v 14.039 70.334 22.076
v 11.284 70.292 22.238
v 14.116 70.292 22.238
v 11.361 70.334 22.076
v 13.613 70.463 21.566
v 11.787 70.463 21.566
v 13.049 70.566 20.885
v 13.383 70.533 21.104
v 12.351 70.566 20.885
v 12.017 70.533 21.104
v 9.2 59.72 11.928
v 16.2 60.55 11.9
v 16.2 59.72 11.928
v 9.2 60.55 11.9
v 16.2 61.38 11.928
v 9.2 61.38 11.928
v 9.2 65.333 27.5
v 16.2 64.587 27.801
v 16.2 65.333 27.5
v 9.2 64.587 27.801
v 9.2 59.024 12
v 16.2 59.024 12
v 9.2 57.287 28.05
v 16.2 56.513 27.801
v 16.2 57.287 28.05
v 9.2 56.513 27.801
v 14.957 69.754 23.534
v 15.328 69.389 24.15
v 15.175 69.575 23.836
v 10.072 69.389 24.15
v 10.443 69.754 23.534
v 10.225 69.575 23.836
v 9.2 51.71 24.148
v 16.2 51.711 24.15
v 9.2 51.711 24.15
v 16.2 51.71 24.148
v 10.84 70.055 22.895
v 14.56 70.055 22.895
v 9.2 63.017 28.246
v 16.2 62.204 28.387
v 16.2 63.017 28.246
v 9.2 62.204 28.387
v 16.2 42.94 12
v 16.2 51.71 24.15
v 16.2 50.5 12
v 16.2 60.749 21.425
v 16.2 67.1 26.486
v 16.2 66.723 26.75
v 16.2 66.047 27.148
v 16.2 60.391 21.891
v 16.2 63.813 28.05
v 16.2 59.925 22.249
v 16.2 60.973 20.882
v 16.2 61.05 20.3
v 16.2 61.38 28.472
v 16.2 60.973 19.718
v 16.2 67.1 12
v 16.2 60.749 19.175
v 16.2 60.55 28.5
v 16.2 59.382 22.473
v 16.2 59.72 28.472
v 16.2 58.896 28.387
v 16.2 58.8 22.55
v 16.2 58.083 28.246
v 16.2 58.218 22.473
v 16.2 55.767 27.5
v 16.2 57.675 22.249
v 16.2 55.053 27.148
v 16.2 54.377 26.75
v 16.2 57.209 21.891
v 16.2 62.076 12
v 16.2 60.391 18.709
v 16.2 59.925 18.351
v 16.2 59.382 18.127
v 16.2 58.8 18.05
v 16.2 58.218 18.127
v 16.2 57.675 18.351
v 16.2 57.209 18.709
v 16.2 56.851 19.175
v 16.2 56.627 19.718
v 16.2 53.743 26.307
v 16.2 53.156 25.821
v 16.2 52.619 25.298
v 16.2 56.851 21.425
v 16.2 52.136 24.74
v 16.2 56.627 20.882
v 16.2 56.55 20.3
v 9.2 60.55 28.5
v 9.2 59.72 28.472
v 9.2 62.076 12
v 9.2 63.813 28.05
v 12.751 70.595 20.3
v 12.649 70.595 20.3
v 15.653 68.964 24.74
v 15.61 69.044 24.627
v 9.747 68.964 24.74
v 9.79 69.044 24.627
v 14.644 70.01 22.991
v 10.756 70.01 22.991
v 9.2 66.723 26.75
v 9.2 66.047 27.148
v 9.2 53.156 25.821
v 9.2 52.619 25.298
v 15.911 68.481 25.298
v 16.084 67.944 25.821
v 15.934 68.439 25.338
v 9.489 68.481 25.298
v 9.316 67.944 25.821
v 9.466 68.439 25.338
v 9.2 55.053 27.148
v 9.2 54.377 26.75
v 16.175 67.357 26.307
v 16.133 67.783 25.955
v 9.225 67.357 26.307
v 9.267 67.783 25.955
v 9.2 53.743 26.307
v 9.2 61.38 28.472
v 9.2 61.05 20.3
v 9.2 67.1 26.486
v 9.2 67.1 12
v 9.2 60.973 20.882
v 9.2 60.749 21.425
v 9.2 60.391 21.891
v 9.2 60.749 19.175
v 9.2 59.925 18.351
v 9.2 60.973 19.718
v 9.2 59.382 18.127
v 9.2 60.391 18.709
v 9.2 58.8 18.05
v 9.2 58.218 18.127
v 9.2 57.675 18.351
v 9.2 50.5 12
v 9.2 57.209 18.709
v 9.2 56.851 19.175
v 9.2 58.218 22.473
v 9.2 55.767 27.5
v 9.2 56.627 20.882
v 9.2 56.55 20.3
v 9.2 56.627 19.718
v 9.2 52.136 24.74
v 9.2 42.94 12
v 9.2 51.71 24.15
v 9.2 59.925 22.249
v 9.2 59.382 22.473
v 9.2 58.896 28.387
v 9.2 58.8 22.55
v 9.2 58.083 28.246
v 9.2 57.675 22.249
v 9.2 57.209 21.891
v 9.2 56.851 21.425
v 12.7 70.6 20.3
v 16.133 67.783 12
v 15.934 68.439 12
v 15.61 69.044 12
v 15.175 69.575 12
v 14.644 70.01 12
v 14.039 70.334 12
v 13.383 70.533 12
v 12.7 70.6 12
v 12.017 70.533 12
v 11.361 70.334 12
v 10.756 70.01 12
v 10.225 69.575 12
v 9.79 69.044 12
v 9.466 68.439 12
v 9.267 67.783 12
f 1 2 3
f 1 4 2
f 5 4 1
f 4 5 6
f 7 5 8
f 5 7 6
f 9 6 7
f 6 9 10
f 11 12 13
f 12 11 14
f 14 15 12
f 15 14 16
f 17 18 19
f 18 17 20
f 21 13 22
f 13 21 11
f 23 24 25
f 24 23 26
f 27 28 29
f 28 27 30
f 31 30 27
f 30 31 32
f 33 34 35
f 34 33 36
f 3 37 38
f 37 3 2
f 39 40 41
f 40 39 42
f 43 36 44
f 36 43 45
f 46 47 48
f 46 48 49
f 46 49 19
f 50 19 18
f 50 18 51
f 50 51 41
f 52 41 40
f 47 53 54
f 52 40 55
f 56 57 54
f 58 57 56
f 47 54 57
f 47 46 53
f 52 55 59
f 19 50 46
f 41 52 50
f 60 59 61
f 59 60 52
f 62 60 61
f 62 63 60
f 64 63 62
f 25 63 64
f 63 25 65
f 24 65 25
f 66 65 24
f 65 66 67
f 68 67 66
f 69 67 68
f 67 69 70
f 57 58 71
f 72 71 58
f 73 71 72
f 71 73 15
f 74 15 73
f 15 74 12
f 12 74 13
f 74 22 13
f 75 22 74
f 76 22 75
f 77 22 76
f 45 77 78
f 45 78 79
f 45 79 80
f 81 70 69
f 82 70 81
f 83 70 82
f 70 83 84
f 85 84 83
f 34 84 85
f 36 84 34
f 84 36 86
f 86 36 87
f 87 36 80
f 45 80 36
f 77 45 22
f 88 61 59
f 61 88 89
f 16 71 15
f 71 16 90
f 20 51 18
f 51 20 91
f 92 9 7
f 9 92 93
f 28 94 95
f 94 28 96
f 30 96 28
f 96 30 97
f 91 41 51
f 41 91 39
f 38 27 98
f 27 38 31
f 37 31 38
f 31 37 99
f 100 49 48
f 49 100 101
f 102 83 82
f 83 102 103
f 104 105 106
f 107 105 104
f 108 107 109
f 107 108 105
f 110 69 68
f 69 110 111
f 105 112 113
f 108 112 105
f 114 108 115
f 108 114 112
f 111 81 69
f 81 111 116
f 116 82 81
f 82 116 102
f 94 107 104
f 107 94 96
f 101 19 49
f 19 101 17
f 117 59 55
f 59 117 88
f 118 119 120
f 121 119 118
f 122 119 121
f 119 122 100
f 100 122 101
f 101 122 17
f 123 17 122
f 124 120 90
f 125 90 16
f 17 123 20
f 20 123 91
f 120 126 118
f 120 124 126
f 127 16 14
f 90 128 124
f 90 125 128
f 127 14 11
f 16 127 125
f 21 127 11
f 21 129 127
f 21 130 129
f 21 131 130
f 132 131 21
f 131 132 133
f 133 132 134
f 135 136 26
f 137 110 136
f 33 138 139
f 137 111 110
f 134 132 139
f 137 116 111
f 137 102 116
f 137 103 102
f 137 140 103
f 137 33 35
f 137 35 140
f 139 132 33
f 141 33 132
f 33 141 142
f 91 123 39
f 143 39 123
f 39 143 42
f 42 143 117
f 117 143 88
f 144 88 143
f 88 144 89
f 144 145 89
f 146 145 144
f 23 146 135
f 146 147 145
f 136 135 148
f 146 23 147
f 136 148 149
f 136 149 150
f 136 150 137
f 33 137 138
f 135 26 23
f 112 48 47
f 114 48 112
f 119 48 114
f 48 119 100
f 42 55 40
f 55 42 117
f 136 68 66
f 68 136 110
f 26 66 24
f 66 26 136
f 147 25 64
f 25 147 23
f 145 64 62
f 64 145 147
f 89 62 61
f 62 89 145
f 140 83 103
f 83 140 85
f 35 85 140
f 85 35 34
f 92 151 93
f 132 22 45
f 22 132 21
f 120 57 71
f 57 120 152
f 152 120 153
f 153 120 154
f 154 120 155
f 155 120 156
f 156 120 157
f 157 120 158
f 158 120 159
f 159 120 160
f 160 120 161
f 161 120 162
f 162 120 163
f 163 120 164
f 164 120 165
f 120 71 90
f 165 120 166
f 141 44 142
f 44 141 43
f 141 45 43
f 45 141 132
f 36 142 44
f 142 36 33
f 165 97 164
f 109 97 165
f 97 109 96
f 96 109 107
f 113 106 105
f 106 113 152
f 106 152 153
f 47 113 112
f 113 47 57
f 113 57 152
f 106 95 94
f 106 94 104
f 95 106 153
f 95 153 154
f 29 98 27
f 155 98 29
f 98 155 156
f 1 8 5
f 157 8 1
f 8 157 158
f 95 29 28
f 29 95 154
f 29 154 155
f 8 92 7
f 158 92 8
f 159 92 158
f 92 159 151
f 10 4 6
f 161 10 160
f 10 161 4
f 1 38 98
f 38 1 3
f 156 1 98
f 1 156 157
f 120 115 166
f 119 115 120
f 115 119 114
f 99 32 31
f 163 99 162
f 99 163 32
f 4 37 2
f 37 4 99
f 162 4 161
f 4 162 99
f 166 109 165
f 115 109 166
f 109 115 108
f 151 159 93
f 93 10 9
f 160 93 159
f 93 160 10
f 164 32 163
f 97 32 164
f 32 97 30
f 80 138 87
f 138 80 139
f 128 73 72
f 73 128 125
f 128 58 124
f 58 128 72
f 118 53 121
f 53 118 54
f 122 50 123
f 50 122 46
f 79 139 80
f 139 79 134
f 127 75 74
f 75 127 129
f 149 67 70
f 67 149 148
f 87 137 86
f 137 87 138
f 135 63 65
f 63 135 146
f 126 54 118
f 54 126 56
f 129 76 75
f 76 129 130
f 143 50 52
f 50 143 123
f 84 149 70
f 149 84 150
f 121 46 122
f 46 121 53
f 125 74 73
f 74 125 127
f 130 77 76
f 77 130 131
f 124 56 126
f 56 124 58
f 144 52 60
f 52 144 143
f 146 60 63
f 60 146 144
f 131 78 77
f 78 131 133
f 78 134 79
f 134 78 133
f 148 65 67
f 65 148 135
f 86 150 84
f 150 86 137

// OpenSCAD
//Delta Emmett P/S Mounting Bracket
//Bracket for mounting P/S on 2 - 1/2" EMT, 2 - 3/4" EMT or 2 - 1/2" PVC Horizontals
//12/9/2015     By: David Bunch
//10/23/2016    Modified for use with an P/S holding bracket
//11/3/2016     Combined 1/2"EMT, 3/4"EMT & 1/2"PVC into 1 file & added extension for short build O.D.

Ht = 12;
ET = 0;                 //0 = 1/2", 1 = 3/4", 2 = 1/2" PVC
HoleID = 3.5;           //Probably need M3x16mm screws for Bracket mount to 3/4" EMT
                        //and M3x30mm screws for 1/2" EMT or 1/2" PVC
PS_Hole_OD = 4.5;       //Diameter of Hole for P/S
BoltHdDia = 7.8;        //Diameer of M3 Bolt Head
M3Nut = 7;              //Diameter of M3 Nut to use

Extend_PS_Hole = 1;     //1 = Extend Hole, 0 = Not
//
//Setup arrays to choose between 1/2"EMT, 3/4"EMT or 1/2"PVC based on ET variable
A_Pipe_Type = [12,34,12];
A_Pipe_OD = [18.4,23.7,21.8];
A_Hole_Y_Offset = [12.5,20,14.2];
A_PS_Hole_Y_Offset = [58.8,41.15,53.7];
A_M3Head_X_Offset = [9.7,5,10.48];
A_M3Nut_X_Offset = [-9.7,-4.97,-10.48];
A_Weld_Offset = [50.5,32.85,45.4];
A_PS_Ext_X_Offset = [9.2,11.9,10.9];
A_End_Cham_Y_Offset = [70.6,52.95,65.5];
A_Z_Ext_Hole = [0,14.3];        //This array based on Extend_PS_Hole Index
                                //14.3mm is the extended height above half height of part
A_CutEnd_Y_Offset = [67.1,49.45,62];
Ht2 = Ht / 2;

Pipe_Type = A_Pipe_Type[ET];
Pipe_OD = A_Pipe_OD[ET];
Hole_Y_Offset = A_Hole_Y_Offset[ET];
Pipe_Y_Offset = Hole_Y_Offset * 2;
PS_Hole_Y_Offset = A_PS_Hole_Y_Offset[ET];
M3Head_X_Offset = A_M3Head_X_Offset[ET];
M3Nut_X_Offset = A_M3Nut_X_Offset[ET];
Weld_Offset = A_Weld_Offset[ET];
PS_Ext_X_Offset = A_PS_Ext_X_Offset[ET];

echo(PS_Ext_X_Offset = PS_Ext_X_Offset);
Z_Ext_Hole = A_Z_Ext_Hole[Extend_PS_Hole];
echo(Z_Ext_Hole = Z_Ext_Hole);
CutEnd_Y_Offset = A_CutEnd_Y_Offset[ET];
End_Cham_Y_Offset = A_End_Cham_Y_Offset[ET];

Weld_OD = 12;           //Originally used 8mm
Hole_Res = 24;
Pipe_Res = (round(((Pipe_OD * 3.14) / 4) / .7) * 4);      //Resolution for Chamfer Pipe Cuts
echo(Pipe_Res = Pipe_Res);
$fn=76;
module PS_Bracket()
{
    if (ET < 2)
    {
        if (Extend_PS_Hole == 0)
        {
            linear_extrude(height = Ht, center = false, convexity = 10)
            import("Pipes_PS_Brackets.dxf", layer = str("EMT",Pipe_Type,"_PS_Bracket_Outline"));
        } else
        {
            union()
            {
                linear_extrude(height = Ht, center = false, convexity = 10)
                import("Pipes_PS_Brackets.dxf", layer = str("EMT",Pipe_Type,"_PS_Bracket_Outline"));
                ExtendConnect();
                translate([PS_Ext_X_Offset+7,PS_Hole_Y_Offset,Ht / 2 + Z_Ext_Hole])
                Fillet_Weld();
//                translate([PS_Ext_X_Offset,Weld_Offset,Ht])
//                rotate([0,90,0])
//                cylinder(d=Weld_OD,h=7,$fn=4);    //I used this simple weld to start with
            }
        }
    } else
    {
        if (Extend_PS_Hole == 0)
        {
            linear_extrude(height = Ht, center = false, convexity = 10)
            import("Pipes_PS_Brackets.dxf", layer = str("PVC",Pipe_Type,"_PS_Bracket_Outline"));
        } else
        {
            union()
            {
                linear_extrude(height = Ht, center = false, convexity = 10)
                import("Pipes_PS_Brackets.dxf", layer = str("PVC",Pipe_Type,"_PS_Bracket_Outline"));
                ExtendConnect();
                translate([PS_Ext_X_Offset+7,PS_Hole_Y_Offset,Ht / 2 + Z_Ext_Hole])
                Fillet_Weld();
//                translate([PS_Ext_X_Offset,Weld_Offset,Ht])
//                rotate([0,90,0])
//                cylinder(d=Weld_OD,h=7,$fn=4);    //I used this simple weld to start with
            }
        }        
    }
}
module PS_Bracket_Cut()
{
    if (ET < 2)
    {
        translate([0,0,-1])
        linear_extrude(height = Ht+ 30, center = false, convexity = 10)
        import("Pipes_PS_Brackets.dxf", layer = str("EMT",Pipe_Type,"_PS_Bracket_Cutout"));
    } else
    {
        translate([0,0,-1])
        linear_extrude(height = Ht + 30, center = false, convexity = 10)
        import("Pipes_PS_Brackets.dxf", layer = str("PVC",Pipe_Type,"_PS_Bracket_Cutout"));
    }
}
module CutNutTrap()
{
    rotate([0,90,0])
    rotate([90,0,0])
    {
        translate([0,0,-2.25])
        cylinder(d=7,h=4.5,$fn=6);
        translate([-20,-3.0311,-2.25])
        cube([20,6.0622,4.5]);
    }
}
module TaperPipe_Hole()
{
    translate([0,0,Ht-1])
    cylinder(d1 = Pipe_OD, d2 = Pipe_OD+2, h = 1.01, $fn = Pipe_Res);
    translate([0,-Pipe_Y_Offset,Ht-1])
    cylinder(d1=Pipe_OD,d2=Pipe_OD+2,h=1.01, $fn = Pipe_Res);

    translate([0,0,-.01])
    cylinder(d1 = Pipe_OD + 2, d2 = Pipe_OD, h = 1.01, $fn = Pipe_Res);
    translate([0,-Pipe_Y_Offset,-.01])
    cylinder(d1 = Pipe_OD + 2, d2 = Pipe_OD, h = 1.01, $fn = Pipe_Res);
}
module ExtendConnect()
{
    translate([PS_Ext_X_Offset,PS_Hole_Y_Offset + 1.75,Ht2 + 14.2])
    rotate([0,90,0])
    scale([1,20.1/16.6,1])
    cylinder(d=16.6,h=7,$fn=76);

    translate([PS_Ext_X_Offset,PS_Hole_Y_Offset - 8.3,Ht])
    cube([7,20.1,8.3]);
}
module Fillet_Weld()
{
    rotate([0,-90,0])
    rotate([0,0,-90])
    linear_extrude(height = 7, center = false, convexity = 10)polygon(points = 
    [[7.09,-8.3],[15.86,-8.3],[7.09,3.85]]);
}

module DrawBracket()
{
    difference()
    {
        PS_Bracket();
        PS_Bracket_Cut();
        translate([PS_Ext_X_Offset+3.5,CutEnd_Y_Offset,-1])
        difference()
        {
            cylinder(d=20,h=30,$fn=32);
            translate([0,0,-1])
            cylinder(d=7,h=32,$fn=32);
            translate([-15,-30,-1])
            cube([30,30,32]);
        }
        translate([0,End_Cham_Y_Offset,0])
        rotate([0,90,0])
        cylinder(d=16,h=30,$fn=4);          //Chamfer the bottom End for less plastic
        translate([-15,-Hole_Y_Offset,Ht2])
        rotate([0,90,0])
        cylinder(d=HoleID,h=30,$fn=Hole_Res);         //M3 hole to tighten Bracket around pipes

        translate([M3Head_X_Offset,-Hole_Y_Offset,Ht2])
        rotate([0,90,0])
        cylinder(d=6,h=3,$fn=Hole_Res);               //Countersink M3 socket head by 2mm
        translate([M3Nut_X_Offset,-Hole_Y_Offset,Ht2])
        rotate([0,-90,0])
        cylinder(d=M3Nut,h=3,$fn=6);               //Countersink M3 Nut by 2mm
        translate([8.2,PS_Hole_Y_Offset,Ht / 2 + Z_Ext_Hole])
        rotate([0,90,0])
        cylinder(d=PS_Hole_OD,h=30,$fn=Hole_Res);         //M4 hole for P/S
        TaperPipe_Hole();
//        translate([0,0,Ht2])
//        cylinder(d=300,h=100);                    //Cross Section Test
    }
}
DrawBracket();
